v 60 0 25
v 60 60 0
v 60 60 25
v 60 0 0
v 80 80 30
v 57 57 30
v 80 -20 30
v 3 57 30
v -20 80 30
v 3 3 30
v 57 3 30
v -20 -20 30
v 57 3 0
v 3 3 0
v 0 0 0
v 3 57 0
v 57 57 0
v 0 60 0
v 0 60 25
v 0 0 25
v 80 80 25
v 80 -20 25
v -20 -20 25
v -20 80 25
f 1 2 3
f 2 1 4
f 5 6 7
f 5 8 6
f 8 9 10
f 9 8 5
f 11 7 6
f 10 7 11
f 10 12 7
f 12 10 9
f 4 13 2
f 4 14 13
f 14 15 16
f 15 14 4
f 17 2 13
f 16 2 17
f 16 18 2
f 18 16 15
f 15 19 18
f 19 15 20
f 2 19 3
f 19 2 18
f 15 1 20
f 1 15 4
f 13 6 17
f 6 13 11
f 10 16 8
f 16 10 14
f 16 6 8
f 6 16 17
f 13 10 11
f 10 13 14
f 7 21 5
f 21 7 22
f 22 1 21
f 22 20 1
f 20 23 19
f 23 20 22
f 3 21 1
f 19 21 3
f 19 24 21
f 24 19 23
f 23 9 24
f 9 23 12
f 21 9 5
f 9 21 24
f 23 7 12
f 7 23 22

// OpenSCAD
// Parameters
outer_size = 60;         // outer width/length of the base square
wall_thickness = 3;      // wall thickness
height = 30;             // height of the 4-sided frame
tab_thickness = 20;      // how much the top lip extends outward
tab_height = 5;          // height of the top lip above the main box

module hollow_square_with_top_lip_connected() {
    difference() {
        // Main hollow box
        cube([outer_size, outer_size, height], center=false);

        // Inner cutout to make it hollow
        translate([wall_thickness, wall_thickness, 0])
            cube([outer_size - 2*wall_thickness, outer_size - 2*wall_thickness, height], center=false);
    }

    // Single continuous tab/lip with 90° corners
    difference() {
        // Outer tab/lip box
        translate([-tab_thickness, -tab_thickness, height - tab_height])
            cube([outer_size + 2 * tab_thickness, outer_size + 2 * tab_thickness, tab_height]);

        // Inner hole to make the lip "ring"-shaped
        translate([0, 0, height - tab_height])
            cube([outer_size, outer_size, tab_height]);
    }
}

// Call the module
hollow_square_with_top_lip_connected();
